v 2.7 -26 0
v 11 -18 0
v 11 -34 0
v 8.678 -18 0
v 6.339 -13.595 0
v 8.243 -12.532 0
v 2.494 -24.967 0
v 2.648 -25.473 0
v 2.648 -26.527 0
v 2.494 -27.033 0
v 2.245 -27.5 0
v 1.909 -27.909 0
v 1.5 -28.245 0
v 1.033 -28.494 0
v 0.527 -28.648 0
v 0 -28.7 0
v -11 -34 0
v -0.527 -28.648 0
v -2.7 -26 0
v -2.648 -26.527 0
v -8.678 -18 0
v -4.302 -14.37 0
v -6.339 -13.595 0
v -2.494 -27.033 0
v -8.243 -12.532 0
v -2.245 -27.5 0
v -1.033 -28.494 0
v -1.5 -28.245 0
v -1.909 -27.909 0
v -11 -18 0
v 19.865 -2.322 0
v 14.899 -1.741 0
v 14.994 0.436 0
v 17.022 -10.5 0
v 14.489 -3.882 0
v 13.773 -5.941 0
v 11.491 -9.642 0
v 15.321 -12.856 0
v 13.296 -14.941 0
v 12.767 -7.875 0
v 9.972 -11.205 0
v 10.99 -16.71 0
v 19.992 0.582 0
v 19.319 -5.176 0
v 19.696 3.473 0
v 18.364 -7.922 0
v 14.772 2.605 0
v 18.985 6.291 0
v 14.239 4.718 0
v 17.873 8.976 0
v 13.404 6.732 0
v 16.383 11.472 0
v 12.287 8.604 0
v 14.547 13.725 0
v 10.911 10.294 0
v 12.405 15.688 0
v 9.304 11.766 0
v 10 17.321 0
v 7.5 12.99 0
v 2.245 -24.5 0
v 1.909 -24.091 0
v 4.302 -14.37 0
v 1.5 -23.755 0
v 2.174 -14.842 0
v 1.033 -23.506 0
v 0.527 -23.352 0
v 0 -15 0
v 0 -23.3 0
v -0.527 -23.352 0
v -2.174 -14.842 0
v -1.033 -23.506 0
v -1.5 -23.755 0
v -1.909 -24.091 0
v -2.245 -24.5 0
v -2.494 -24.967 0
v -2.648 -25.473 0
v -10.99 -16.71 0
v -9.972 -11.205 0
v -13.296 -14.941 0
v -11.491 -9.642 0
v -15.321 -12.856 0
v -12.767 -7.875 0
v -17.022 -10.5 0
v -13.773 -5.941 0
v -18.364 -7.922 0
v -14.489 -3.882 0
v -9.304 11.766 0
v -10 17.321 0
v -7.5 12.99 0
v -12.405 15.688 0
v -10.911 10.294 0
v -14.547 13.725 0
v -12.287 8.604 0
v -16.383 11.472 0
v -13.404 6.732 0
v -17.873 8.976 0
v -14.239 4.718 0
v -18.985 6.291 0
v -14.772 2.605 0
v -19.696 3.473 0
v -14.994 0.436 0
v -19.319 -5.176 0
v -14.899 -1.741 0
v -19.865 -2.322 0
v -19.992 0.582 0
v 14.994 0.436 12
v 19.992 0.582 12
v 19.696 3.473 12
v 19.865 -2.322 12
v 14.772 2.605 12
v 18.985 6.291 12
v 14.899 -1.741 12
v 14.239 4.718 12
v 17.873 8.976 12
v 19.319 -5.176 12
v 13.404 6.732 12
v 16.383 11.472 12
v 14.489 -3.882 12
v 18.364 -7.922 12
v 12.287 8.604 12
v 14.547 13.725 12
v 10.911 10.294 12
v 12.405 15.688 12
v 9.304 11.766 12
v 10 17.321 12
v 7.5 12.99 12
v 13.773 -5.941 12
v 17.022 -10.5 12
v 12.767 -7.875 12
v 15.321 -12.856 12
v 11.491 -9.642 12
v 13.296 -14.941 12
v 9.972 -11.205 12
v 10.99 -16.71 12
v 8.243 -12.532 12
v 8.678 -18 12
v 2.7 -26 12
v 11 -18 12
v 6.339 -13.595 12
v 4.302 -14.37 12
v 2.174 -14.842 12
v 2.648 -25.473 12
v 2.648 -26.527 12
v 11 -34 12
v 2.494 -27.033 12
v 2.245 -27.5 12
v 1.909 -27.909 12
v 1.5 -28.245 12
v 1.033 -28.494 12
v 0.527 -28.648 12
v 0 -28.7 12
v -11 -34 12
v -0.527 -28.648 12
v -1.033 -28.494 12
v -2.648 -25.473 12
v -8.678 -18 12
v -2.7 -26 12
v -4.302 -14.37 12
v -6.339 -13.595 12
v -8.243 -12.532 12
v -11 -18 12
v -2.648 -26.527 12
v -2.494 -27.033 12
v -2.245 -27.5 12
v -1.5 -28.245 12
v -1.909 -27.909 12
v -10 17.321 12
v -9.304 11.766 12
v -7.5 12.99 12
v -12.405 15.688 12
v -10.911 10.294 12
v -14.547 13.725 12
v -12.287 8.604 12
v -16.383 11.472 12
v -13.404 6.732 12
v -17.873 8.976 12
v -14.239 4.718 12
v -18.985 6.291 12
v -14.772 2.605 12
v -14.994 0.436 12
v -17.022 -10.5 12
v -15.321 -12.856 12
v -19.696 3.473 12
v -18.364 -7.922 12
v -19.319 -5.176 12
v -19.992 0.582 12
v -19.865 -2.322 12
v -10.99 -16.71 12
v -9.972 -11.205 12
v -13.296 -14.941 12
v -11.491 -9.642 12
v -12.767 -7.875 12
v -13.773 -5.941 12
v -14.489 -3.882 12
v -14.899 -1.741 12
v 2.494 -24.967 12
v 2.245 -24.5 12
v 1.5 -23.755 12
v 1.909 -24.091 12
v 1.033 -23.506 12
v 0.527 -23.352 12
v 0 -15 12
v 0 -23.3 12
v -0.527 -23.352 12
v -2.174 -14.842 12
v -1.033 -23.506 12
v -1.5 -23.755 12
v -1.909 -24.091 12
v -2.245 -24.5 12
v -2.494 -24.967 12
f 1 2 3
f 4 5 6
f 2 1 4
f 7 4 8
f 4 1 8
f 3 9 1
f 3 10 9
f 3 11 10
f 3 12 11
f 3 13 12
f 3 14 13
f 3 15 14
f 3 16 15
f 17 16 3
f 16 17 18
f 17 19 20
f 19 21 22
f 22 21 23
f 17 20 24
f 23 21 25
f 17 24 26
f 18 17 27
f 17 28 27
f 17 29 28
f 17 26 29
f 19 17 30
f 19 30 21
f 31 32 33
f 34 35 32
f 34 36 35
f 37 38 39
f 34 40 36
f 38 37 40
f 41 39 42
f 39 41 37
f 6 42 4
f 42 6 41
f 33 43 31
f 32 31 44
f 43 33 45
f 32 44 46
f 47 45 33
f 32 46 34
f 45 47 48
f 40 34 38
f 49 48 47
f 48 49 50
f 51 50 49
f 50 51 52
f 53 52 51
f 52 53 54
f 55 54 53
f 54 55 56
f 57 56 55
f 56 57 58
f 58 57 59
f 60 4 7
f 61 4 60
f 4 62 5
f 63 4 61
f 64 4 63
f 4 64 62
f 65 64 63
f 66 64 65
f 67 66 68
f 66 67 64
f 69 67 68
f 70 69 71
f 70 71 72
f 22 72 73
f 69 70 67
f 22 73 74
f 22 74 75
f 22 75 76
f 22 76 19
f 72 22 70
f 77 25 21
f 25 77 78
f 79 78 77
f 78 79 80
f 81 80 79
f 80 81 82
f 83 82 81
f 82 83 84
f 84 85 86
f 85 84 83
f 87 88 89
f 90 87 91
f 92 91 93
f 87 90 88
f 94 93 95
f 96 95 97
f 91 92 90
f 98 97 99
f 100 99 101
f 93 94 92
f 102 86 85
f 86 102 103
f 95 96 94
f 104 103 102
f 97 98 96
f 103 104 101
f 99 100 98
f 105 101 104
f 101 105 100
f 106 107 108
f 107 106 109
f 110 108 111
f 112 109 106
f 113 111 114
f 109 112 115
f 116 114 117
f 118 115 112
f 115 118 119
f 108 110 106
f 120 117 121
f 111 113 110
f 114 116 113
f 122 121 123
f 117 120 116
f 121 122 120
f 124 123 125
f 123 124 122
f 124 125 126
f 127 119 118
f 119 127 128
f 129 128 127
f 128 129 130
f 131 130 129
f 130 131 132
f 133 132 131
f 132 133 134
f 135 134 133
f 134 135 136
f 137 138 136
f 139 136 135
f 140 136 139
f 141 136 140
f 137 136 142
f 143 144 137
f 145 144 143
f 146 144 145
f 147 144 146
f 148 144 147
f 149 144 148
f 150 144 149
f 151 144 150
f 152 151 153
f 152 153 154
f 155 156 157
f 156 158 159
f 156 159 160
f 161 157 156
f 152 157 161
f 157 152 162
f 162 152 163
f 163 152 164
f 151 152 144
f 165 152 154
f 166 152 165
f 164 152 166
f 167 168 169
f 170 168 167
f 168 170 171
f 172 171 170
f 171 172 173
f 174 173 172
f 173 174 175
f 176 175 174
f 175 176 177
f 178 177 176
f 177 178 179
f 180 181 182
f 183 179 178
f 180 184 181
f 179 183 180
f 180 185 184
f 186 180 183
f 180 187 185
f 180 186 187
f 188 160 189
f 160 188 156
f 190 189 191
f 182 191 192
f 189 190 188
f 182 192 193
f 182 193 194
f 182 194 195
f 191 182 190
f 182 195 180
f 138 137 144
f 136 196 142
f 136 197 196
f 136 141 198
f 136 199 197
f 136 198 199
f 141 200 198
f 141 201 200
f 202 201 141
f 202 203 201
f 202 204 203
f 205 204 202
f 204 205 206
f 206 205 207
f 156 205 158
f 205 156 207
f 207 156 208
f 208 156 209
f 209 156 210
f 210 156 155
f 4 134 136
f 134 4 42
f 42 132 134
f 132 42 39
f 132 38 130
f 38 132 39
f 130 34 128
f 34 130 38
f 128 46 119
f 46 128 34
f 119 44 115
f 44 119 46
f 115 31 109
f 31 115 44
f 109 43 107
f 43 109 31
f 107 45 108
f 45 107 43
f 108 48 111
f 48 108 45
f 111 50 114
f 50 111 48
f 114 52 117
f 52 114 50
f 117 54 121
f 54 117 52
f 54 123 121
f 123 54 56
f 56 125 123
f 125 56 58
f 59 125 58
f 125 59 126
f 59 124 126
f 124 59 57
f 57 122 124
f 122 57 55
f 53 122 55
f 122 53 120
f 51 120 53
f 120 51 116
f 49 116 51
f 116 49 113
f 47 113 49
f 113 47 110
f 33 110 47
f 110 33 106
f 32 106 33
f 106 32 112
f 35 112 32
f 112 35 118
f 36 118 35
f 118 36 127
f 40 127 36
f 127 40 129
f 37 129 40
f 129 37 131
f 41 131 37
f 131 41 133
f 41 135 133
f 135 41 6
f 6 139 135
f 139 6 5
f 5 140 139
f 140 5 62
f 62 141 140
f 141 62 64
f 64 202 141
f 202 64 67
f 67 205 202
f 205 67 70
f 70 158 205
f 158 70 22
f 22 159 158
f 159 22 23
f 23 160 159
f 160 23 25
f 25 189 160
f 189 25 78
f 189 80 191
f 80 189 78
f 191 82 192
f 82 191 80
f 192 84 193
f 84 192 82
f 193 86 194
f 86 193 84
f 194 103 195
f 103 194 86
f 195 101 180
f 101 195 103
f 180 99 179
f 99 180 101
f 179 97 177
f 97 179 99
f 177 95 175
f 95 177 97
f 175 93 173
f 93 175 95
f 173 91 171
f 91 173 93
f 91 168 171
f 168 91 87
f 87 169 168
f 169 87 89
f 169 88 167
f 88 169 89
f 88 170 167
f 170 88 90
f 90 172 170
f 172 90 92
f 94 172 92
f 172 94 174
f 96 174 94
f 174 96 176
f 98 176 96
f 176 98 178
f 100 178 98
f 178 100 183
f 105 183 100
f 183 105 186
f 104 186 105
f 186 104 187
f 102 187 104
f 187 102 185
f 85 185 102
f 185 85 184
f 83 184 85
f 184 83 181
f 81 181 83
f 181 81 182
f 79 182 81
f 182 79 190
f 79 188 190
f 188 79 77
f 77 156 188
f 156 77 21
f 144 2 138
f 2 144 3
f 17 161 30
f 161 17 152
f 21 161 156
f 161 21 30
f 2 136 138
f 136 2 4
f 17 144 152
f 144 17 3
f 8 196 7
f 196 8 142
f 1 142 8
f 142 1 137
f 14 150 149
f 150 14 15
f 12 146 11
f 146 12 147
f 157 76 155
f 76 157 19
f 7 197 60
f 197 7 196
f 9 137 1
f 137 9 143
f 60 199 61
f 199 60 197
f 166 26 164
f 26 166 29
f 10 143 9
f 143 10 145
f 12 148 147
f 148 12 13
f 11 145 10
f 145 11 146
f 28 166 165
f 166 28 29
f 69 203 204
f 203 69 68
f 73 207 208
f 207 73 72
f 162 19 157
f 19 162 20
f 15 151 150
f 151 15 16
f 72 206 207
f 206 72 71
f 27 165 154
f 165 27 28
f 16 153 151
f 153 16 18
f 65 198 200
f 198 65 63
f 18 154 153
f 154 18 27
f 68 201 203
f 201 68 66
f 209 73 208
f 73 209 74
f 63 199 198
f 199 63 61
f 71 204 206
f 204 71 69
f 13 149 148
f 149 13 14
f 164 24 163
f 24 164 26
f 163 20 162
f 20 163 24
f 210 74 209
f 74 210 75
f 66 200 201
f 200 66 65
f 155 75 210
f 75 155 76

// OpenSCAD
$fn = 32;

// ----------------------------------------------------------------------
// Spring clip: 40 mm outside, 5 mm band, 60 degree opening
// ----------------------------------------------------------------------

// --- parameters (mm) ---
outer_r = 20;             // clip outside radius
inner_r = 15;             // clip bore radius
band = 5;                 // band thickness
clip_w = 12;              // clip width
opening = 60;             // opening angle
tab_w = 22;               // tab width
tab_len = 14;             // tab length past the clip
tab_hole = 5.4;           // tab fixing hole

clip_profile = [[-10, 17.321], [-12.405, 15.688], [-14.547, 13.725], [-16.383, 11.472], [-17.873, 8.976], [-18.985, 6.291], [-19.696, 3.473], [-19.992, 0.582], [-19.865, -2.322], [-19.319, -5.176], [-18.364, -7.922], [-17.022, -10.5], [-15.321, -12.856], [-13.296, -14.941], [-10.99, -16.71], [-8.452, -18.126], [-5.736, -19.16], [-2.899, -19.789], [0, -20], [2.899, -19.789], [5.736, -19.16], [8.452, -18.126], [10.99, -16.71], [13.296, -14.941], [15.321, -12.856], [17.022, -10.5], [18.364, -7.922], [19.319, -5.176], [19.865, -2.322], [19.992, 0.582], [19.696, 3.473], [18.985, 6.291], [17.873, 8.976], [16.383, 11.472], [14.547, 13.725], [12.405, 15.688], [10, 17.321], [7.5, 12.99], [9.304, 11.766], [10.911, 10.294], [12.287, 8.604], [13.404, 6.732], [14.239, 4.718], [14.772, 2.605], [14.994, 0.436], [14.899, -1.741], [14.489, -3.882], [13.773, -5.941], [12.767, -7.875], [11.491, -9.642], [9.972, -11.205], [8.243, -12.532], [6.339, -13.595], [4.302, -14.37], [2.174, -14.842], [0, -15], [-2.174, -14.842], [-4.302, -14.37], [-6.339, -13.595], [-8.243, -12.532], [-9.972, -11.205], [-11.491, -9.642], [-12.767, -7.875], [-13.773, -5.941], [-14.489, -3.882], [-14.899, -1.741], [-14.994, 0.436], [-14.772, 2.605], [-14.239, 4.718], [-13.404, 6.732], [-12.287, 8.604], [-10.911, 10.294], [-9.304, 11.766], [-7.5, 12.99]];

difference() {
  union() {
    linear_extrude(height = clip_w) polygon(clip_profile);
    /* mounting tab, sunk 2 mm into the band */
    translate([-11, -34, 0]) cube([tab_w, 16, clip_w]);
  }
  translate([0, -26, -2.5]) cylinder(h = clip_w + 5, d = tab_hole);
}
